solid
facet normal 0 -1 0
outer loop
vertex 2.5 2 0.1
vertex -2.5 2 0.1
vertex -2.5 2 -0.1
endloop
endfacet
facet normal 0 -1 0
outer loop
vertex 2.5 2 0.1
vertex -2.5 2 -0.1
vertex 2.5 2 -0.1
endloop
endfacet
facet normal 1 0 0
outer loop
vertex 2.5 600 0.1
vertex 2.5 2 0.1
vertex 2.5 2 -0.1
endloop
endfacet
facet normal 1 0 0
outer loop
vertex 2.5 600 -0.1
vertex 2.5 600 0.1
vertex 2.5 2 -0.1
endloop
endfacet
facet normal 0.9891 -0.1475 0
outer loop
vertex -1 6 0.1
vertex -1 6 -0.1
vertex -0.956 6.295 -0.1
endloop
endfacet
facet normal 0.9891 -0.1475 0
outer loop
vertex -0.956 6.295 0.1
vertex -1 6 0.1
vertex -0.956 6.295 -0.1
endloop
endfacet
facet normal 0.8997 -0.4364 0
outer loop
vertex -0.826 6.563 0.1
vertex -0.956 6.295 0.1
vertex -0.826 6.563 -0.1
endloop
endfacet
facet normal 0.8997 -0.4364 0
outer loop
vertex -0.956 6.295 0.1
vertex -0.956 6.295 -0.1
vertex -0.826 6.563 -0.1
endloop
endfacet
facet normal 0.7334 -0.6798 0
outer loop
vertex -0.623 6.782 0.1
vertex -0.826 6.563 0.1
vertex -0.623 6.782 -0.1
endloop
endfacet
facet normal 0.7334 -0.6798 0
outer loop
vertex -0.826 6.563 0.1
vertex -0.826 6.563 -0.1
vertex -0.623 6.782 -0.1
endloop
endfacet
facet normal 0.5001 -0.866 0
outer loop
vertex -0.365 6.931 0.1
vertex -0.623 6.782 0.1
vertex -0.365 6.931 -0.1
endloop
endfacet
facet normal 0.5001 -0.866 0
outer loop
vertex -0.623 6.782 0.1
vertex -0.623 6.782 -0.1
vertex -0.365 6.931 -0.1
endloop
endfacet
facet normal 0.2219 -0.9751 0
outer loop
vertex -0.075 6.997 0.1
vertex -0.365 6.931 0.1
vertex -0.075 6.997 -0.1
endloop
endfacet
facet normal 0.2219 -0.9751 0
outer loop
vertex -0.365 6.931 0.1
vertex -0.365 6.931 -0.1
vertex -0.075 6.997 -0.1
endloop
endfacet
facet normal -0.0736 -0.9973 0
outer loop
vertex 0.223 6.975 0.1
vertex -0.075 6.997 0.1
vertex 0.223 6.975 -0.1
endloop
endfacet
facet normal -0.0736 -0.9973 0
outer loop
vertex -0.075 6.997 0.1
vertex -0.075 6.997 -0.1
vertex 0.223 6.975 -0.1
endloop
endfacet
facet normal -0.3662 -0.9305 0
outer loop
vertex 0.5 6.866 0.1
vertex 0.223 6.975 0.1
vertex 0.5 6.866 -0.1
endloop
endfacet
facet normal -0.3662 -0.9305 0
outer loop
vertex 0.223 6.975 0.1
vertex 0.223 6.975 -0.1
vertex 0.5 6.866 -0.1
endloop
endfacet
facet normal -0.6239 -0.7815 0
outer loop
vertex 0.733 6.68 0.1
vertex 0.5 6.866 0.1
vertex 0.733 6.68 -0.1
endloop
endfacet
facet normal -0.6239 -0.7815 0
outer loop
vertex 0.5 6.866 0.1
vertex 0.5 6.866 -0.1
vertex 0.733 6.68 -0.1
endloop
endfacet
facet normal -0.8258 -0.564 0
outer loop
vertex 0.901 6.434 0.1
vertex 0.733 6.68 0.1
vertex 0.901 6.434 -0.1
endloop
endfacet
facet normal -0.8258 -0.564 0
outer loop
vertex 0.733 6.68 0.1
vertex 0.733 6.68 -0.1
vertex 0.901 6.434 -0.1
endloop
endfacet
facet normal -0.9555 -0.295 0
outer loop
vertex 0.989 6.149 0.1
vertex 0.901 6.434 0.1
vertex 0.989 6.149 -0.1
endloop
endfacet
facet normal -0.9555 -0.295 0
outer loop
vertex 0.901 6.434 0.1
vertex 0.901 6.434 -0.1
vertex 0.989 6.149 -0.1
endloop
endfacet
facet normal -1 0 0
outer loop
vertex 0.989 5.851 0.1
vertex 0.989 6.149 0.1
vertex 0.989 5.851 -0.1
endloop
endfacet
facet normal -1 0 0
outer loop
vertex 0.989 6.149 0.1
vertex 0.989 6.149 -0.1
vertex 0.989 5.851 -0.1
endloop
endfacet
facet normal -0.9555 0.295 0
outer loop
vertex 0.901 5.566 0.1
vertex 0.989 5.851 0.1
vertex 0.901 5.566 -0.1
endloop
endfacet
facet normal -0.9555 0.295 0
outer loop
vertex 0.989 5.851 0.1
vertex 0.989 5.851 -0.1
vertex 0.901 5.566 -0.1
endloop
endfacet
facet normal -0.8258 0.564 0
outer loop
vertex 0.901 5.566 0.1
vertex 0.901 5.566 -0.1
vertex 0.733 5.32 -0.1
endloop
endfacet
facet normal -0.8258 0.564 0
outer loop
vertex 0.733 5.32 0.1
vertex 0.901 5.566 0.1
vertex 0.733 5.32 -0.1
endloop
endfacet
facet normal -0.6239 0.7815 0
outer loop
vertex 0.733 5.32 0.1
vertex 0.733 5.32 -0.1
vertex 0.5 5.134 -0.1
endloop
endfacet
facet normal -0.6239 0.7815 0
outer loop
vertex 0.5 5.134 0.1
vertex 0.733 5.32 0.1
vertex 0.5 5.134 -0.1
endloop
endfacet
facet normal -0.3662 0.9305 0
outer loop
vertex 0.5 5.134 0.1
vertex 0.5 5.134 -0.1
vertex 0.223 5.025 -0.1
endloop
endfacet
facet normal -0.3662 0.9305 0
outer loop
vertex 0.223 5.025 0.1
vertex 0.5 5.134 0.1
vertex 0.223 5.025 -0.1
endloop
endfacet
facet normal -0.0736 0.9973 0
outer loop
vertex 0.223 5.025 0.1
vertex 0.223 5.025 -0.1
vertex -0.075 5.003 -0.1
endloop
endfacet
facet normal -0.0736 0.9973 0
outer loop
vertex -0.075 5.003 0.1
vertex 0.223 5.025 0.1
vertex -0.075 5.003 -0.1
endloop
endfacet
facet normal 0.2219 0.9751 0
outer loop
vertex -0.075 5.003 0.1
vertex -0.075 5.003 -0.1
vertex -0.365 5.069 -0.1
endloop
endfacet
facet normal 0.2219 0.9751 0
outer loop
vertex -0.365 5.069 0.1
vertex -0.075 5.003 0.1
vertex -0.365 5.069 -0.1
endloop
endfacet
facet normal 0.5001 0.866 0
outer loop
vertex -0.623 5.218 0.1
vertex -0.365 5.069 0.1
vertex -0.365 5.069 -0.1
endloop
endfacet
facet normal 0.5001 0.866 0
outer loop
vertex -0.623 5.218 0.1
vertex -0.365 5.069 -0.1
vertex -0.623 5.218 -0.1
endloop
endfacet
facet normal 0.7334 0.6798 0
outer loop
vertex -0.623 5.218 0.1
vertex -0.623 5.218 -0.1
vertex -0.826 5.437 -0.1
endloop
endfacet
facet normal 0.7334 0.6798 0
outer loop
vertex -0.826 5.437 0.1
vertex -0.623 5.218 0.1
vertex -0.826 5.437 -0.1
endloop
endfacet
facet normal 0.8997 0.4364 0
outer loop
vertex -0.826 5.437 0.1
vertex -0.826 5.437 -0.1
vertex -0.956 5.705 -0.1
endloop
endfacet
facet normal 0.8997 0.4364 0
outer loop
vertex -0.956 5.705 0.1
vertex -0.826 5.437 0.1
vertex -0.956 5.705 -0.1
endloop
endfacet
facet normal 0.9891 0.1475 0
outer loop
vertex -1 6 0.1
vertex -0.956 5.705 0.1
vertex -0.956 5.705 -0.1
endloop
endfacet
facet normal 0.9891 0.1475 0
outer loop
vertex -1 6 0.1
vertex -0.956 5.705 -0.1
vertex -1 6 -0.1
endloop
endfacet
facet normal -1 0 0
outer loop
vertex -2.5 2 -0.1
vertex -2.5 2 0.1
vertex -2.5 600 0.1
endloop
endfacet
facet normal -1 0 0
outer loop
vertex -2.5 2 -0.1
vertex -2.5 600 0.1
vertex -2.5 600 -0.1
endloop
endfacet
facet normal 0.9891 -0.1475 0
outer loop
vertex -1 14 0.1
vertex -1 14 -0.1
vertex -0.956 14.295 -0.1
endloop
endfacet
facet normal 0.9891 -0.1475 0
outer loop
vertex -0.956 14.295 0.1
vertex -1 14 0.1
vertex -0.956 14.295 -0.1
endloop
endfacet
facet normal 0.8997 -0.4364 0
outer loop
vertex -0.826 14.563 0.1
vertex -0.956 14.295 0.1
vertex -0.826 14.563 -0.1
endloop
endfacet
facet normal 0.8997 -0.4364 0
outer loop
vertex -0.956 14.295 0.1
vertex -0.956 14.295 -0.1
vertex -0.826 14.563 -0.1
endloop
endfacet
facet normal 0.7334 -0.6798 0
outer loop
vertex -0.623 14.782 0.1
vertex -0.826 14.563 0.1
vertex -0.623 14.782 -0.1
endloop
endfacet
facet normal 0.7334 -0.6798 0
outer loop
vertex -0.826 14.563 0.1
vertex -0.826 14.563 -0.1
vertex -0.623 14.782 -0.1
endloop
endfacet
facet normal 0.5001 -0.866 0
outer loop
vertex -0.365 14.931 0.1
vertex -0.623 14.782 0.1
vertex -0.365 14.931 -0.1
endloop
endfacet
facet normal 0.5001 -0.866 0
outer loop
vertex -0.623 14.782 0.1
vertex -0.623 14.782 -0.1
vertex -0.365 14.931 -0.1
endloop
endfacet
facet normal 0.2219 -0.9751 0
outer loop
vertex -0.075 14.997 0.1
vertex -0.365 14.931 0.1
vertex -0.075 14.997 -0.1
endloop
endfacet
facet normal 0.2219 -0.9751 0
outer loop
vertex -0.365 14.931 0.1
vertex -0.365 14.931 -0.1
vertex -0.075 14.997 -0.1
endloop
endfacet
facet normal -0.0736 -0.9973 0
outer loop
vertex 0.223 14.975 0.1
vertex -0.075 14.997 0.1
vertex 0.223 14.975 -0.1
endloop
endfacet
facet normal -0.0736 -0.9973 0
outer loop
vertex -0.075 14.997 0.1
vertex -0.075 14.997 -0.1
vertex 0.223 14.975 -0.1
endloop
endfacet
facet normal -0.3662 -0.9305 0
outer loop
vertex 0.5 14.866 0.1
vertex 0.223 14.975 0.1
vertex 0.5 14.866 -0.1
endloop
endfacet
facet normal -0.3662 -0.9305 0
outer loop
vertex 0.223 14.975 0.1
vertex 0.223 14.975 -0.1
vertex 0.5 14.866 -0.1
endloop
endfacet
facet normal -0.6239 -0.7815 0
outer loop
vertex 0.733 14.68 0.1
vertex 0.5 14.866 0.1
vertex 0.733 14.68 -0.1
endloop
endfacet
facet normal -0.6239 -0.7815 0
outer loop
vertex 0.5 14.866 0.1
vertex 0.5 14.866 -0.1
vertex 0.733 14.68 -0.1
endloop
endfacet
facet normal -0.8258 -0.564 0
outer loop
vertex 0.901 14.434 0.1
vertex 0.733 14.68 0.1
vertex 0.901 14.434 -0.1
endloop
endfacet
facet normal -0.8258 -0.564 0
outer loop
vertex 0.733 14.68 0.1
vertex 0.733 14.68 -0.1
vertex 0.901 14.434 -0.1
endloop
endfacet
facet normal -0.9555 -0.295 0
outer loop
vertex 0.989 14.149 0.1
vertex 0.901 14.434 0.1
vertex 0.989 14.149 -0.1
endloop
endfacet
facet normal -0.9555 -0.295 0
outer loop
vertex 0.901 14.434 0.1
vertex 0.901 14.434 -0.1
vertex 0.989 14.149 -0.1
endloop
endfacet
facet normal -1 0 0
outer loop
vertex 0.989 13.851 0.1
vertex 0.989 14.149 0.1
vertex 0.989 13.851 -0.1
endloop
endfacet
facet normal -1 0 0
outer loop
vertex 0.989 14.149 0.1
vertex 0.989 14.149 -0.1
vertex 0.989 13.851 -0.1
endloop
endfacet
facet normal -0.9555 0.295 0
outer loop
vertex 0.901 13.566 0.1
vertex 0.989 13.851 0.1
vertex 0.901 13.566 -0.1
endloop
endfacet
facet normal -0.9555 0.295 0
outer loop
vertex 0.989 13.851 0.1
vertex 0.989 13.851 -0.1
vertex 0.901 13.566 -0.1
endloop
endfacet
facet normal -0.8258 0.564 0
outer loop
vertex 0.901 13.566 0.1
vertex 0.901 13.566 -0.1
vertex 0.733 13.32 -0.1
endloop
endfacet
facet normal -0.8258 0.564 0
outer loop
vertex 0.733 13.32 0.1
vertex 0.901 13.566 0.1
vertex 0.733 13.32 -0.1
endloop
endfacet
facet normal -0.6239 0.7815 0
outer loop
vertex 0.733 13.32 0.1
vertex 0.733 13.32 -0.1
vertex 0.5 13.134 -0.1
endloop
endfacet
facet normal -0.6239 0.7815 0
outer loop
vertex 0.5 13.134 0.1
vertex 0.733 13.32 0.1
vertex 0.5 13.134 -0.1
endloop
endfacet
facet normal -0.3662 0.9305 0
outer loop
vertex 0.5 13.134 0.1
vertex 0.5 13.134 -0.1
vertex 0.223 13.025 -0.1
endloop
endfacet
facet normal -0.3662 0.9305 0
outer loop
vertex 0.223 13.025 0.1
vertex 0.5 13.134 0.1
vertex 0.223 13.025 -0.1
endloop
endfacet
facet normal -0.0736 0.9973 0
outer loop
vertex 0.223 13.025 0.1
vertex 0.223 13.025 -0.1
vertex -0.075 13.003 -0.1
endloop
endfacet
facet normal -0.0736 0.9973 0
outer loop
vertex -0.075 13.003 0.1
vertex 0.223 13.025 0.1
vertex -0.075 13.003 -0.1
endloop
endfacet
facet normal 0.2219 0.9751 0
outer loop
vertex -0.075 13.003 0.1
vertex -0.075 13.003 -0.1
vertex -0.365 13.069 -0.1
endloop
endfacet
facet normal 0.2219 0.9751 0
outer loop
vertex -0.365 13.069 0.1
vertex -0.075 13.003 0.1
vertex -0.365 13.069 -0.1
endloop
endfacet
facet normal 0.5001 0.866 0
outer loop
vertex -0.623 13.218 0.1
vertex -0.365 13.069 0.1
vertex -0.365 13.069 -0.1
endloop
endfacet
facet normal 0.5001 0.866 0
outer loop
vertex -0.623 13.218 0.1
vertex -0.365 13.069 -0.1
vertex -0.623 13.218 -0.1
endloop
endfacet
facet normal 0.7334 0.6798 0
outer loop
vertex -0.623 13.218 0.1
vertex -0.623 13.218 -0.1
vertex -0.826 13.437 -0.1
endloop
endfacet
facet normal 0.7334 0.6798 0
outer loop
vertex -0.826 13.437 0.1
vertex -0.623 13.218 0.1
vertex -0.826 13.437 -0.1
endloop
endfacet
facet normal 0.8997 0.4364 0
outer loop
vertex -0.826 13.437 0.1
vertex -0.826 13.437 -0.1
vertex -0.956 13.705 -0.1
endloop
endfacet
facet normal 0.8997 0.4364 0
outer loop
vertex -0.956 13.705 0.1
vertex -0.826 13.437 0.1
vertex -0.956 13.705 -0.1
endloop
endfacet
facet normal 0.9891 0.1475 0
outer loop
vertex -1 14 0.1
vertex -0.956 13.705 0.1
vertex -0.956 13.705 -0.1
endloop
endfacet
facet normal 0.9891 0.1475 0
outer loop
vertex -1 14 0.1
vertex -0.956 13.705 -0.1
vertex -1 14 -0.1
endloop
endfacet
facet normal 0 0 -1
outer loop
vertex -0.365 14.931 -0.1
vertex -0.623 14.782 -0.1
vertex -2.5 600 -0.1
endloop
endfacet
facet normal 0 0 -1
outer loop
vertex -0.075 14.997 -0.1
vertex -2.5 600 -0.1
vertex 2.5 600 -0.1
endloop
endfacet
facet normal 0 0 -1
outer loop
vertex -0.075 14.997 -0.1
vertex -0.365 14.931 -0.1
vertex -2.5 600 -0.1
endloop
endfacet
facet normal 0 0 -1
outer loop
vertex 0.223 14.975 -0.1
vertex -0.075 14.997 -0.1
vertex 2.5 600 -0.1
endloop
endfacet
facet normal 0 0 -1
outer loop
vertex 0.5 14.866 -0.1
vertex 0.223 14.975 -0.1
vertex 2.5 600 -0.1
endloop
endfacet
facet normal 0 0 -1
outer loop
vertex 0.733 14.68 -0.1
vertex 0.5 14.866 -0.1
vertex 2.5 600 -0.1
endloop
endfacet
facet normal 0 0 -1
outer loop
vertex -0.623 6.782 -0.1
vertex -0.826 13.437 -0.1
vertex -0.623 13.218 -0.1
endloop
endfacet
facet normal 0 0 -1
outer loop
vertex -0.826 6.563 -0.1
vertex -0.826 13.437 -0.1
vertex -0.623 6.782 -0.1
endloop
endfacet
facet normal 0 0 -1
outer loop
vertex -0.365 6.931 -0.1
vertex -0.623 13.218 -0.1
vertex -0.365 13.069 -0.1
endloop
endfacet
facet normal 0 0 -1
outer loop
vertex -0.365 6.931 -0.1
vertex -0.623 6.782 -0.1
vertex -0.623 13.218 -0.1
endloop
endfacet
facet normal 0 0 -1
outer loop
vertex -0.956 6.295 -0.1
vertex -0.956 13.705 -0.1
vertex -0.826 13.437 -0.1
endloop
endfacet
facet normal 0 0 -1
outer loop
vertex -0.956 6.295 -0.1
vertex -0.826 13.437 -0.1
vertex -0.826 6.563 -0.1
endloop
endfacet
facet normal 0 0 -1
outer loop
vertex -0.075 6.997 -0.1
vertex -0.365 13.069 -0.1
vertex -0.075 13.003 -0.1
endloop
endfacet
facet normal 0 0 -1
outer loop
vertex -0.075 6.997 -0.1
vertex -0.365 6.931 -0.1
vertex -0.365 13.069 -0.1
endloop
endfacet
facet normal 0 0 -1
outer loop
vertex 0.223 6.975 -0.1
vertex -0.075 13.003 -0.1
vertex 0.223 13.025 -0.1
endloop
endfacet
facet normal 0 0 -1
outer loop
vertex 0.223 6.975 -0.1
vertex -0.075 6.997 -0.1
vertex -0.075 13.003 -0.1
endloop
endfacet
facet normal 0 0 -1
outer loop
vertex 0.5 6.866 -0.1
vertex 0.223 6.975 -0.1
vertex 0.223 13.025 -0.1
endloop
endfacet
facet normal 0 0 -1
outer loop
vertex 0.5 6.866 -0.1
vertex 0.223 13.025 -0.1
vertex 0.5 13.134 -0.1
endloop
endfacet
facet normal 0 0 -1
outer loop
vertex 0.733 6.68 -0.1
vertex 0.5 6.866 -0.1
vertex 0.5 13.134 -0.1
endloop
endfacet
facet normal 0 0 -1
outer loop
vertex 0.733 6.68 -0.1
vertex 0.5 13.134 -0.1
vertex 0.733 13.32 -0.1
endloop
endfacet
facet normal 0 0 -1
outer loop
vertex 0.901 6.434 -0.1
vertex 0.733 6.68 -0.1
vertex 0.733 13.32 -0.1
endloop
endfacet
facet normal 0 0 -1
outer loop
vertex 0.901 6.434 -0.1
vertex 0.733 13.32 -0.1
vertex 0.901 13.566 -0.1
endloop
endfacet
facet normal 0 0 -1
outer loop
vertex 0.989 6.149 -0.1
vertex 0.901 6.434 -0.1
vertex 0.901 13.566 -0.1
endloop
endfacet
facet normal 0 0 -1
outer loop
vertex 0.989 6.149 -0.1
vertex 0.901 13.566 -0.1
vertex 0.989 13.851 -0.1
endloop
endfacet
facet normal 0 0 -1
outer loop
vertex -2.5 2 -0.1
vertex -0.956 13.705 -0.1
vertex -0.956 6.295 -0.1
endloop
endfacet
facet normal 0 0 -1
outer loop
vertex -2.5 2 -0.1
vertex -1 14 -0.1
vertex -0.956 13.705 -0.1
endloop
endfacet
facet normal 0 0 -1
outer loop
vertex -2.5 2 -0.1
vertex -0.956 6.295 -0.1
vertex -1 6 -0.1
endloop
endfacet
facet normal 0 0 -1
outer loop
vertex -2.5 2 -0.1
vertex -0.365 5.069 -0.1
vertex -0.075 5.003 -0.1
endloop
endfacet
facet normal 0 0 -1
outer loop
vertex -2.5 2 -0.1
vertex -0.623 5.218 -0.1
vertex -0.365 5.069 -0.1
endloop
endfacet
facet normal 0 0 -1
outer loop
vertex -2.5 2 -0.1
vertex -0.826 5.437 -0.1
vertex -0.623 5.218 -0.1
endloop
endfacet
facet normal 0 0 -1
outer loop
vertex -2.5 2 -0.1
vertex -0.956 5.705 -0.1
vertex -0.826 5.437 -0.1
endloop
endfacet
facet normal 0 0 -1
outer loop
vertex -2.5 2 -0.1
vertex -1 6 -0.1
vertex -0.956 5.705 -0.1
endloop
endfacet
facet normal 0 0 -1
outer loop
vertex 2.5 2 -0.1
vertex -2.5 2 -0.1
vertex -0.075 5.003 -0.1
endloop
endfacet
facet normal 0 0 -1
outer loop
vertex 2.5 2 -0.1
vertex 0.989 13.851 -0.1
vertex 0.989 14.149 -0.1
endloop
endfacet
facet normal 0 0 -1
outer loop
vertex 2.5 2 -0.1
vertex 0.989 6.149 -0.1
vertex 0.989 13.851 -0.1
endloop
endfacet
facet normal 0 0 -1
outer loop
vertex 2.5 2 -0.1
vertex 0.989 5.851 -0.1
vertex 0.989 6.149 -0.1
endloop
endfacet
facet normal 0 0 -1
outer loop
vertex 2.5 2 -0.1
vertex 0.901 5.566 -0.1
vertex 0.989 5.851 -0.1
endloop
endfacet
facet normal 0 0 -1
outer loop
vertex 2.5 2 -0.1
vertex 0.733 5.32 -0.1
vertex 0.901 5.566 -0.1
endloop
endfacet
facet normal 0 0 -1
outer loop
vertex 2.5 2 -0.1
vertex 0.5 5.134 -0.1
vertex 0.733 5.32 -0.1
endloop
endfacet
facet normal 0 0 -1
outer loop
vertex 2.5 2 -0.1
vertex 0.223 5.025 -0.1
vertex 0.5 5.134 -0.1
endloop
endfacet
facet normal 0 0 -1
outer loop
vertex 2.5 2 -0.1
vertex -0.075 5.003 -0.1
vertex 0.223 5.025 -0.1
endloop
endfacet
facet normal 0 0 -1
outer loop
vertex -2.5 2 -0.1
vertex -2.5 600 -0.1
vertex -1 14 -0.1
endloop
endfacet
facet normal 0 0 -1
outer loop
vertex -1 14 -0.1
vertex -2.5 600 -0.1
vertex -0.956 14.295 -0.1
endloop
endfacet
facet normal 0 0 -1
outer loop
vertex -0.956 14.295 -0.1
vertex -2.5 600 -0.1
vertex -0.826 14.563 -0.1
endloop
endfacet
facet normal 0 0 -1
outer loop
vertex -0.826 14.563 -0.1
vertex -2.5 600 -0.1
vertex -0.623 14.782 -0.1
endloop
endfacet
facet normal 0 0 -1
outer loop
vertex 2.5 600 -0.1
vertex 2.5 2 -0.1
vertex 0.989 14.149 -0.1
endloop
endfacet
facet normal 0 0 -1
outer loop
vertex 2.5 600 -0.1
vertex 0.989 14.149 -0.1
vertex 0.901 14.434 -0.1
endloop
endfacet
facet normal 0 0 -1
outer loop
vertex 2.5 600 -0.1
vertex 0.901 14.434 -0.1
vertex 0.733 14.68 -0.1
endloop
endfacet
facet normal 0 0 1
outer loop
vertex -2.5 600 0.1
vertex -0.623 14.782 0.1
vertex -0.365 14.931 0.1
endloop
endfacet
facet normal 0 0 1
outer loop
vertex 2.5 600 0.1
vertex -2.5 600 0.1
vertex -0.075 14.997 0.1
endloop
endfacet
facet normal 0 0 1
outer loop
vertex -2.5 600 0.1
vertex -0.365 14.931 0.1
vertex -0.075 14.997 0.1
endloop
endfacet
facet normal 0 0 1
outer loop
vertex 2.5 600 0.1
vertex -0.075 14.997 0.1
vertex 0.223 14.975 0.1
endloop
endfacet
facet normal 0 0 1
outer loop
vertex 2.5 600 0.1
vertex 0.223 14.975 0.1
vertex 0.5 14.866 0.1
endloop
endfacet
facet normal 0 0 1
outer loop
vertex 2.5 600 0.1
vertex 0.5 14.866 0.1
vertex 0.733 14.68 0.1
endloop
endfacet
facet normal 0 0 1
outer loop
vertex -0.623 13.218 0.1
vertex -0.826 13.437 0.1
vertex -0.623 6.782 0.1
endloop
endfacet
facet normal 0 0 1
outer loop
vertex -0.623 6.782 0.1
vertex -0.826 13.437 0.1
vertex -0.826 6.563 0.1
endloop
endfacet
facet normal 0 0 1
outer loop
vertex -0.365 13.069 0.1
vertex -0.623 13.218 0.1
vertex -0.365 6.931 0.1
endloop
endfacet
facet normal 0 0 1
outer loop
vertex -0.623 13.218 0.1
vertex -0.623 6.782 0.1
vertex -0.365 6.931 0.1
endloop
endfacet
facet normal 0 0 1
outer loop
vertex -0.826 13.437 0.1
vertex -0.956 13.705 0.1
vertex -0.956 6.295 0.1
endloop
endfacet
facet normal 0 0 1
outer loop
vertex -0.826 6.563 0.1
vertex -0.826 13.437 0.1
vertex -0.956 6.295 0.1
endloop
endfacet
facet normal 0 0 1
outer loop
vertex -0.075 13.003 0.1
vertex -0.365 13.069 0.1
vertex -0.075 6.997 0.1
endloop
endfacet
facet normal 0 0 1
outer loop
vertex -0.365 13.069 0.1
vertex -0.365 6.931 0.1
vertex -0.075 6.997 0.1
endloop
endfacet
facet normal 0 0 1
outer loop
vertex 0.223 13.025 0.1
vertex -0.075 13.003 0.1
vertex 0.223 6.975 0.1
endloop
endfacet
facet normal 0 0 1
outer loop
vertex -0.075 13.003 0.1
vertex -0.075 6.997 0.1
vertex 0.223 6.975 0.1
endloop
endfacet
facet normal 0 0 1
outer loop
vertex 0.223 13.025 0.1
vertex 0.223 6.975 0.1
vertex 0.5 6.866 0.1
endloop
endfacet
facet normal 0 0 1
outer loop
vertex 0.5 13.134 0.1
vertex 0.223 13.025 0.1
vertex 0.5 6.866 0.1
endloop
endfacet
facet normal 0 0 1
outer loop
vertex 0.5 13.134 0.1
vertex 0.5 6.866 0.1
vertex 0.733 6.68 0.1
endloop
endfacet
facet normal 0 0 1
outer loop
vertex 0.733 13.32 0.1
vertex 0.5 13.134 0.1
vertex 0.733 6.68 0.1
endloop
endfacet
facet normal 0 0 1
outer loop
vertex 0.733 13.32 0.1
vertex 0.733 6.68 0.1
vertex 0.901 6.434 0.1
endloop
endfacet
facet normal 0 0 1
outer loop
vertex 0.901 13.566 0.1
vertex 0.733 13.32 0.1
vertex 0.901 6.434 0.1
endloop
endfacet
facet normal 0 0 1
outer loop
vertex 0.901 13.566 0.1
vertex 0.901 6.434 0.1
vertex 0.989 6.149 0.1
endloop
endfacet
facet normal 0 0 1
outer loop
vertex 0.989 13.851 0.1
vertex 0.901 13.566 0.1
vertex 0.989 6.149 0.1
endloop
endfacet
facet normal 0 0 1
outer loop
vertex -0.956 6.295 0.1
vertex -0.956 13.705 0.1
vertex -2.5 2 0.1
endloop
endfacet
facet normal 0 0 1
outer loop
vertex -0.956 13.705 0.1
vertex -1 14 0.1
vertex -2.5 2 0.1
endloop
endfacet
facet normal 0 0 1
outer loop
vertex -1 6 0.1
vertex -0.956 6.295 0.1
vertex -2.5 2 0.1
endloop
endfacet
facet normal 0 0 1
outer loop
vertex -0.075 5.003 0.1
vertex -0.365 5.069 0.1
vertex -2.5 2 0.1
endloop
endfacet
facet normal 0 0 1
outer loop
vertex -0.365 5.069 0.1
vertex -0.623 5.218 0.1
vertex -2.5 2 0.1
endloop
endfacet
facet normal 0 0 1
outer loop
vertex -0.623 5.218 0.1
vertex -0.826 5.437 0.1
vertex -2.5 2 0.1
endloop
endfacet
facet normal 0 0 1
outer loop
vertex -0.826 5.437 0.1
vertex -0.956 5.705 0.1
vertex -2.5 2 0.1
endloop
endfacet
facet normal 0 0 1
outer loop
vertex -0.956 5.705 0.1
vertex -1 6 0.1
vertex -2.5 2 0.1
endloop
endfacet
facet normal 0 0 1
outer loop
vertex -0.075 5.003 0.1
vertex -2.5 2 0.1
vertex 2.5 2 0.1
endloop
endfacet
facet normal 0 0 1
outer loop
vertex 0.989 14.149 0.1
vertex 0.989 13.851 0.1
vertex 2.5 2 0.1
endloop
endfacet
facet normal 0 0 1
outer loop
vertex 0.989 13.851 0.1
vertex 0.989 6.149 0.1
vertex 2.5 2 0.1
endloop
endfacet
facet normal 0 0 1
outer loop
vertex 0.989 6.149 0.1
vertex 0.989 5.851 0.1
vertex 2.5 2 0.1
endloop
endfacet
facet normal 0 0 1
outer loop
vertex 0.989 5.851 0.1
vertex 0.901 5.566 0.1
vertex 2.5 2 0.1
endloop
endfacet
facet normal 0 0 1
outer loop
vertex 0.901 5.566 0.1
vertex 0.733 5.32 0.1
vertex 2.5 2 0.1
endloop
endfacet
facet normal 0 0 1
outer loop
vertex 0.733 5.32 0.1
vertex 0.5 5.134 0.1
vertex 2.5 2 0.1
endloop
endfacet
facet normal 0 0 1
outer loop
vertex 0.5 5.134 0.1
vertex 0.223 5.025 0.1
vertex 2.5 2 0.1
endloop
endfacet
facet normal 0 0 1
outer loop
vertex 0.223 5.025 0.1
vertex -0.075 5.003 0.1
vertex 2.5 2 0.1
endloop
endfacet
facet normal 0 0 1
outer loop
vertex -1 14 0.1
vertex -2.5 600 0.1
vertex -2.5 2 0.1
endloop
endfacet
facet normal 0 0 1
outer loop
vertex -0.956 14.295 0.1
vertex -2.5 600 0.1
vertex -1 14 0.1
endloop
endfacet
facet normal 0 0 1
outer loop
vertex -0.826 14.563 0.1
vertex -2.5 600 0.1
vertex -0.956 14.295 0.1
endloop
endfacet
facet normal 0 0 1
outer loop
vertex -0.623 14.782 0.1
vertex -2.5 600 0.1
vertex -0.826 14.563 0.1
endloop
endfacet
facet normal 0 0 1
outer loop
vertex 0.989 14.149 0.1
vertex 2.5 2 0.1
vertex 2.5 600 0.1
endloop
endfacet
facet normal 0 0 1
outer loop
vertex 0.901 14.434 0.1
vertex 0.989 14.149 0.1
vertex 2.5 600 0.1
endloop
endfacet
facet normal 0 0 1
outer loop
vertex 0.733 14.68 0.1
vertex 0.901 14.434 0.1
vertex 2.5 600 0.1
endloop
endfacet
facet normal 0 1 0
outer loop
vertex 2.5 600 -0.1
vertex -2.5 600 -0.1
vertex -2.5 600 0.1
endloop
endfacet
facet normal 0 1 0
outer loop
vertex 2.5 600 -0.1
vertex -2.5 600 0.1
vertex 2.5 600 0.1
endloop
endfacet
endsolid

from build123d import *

# Parameters (mm, degrees)
SKETCH1_W           = 5
SKETCH1_H           = 0.2
BOSS_EXTRUDE1_DEPTH = 600
SKETCH2_R           = 1
CUT_EXTRUDE1_DEPTH  = 601.005241644
CUT_EXTRUDE2_REACH  = 602.005
SKETCH3_W           = 5
SKETCH3_H           = 2


with BuildPart() as part:
    # Sketch1 → Boss-Extrude1 (new body)
    with BuildSketch(Plane(origin=(0, 0, 0), x_dir=(1, 0, 0), z_dir=(0, 1, 0))):
        Rectangle(SKETCH1_W, SKETCH1_H)
    extrude(amount=BOSS_EXTRUDE1_DEPTH)

    # Sketch2 → Cut-Extrude1 (cut, through all)
    with BuildSketch(Plane(origin=(0, 0, -0.1), x_dir=(-1, 0, 0), z_dir=(0, 0, -1))):
        with Locations((0, 14)):
            Circle(SKETCH2_R)
        with Locations((0, 6)):
            Circle(SKETCH2_R)
    extrude(amount=-CUT_EXTRUDE1_DEPTH, mode=Mode.SUBTRACT)

    # Sketch3 → Cut-Extrude2 (cut, up to next)
    with BuildSketch(Plane.XY.offset(0.1), mode=Mode.PRIVATE) as cut_extrude2_sk1:
        with Locations((0, 1)):
            Rectangle(SKETCH3_W, SKETCH3_H)
    cut_extrude2_tool1 = extrude(cut_extrude2_sk1.sketch, amount=-CUT_EXTRUDE2_REACH, mode=Mode.PRIVATE) & part.part
    add(cut_extrude2_tool1.solids().sort_by_distance((0, 1, 0.1))[0], mode=Mode.SUBTRACT)


solid = part.part
